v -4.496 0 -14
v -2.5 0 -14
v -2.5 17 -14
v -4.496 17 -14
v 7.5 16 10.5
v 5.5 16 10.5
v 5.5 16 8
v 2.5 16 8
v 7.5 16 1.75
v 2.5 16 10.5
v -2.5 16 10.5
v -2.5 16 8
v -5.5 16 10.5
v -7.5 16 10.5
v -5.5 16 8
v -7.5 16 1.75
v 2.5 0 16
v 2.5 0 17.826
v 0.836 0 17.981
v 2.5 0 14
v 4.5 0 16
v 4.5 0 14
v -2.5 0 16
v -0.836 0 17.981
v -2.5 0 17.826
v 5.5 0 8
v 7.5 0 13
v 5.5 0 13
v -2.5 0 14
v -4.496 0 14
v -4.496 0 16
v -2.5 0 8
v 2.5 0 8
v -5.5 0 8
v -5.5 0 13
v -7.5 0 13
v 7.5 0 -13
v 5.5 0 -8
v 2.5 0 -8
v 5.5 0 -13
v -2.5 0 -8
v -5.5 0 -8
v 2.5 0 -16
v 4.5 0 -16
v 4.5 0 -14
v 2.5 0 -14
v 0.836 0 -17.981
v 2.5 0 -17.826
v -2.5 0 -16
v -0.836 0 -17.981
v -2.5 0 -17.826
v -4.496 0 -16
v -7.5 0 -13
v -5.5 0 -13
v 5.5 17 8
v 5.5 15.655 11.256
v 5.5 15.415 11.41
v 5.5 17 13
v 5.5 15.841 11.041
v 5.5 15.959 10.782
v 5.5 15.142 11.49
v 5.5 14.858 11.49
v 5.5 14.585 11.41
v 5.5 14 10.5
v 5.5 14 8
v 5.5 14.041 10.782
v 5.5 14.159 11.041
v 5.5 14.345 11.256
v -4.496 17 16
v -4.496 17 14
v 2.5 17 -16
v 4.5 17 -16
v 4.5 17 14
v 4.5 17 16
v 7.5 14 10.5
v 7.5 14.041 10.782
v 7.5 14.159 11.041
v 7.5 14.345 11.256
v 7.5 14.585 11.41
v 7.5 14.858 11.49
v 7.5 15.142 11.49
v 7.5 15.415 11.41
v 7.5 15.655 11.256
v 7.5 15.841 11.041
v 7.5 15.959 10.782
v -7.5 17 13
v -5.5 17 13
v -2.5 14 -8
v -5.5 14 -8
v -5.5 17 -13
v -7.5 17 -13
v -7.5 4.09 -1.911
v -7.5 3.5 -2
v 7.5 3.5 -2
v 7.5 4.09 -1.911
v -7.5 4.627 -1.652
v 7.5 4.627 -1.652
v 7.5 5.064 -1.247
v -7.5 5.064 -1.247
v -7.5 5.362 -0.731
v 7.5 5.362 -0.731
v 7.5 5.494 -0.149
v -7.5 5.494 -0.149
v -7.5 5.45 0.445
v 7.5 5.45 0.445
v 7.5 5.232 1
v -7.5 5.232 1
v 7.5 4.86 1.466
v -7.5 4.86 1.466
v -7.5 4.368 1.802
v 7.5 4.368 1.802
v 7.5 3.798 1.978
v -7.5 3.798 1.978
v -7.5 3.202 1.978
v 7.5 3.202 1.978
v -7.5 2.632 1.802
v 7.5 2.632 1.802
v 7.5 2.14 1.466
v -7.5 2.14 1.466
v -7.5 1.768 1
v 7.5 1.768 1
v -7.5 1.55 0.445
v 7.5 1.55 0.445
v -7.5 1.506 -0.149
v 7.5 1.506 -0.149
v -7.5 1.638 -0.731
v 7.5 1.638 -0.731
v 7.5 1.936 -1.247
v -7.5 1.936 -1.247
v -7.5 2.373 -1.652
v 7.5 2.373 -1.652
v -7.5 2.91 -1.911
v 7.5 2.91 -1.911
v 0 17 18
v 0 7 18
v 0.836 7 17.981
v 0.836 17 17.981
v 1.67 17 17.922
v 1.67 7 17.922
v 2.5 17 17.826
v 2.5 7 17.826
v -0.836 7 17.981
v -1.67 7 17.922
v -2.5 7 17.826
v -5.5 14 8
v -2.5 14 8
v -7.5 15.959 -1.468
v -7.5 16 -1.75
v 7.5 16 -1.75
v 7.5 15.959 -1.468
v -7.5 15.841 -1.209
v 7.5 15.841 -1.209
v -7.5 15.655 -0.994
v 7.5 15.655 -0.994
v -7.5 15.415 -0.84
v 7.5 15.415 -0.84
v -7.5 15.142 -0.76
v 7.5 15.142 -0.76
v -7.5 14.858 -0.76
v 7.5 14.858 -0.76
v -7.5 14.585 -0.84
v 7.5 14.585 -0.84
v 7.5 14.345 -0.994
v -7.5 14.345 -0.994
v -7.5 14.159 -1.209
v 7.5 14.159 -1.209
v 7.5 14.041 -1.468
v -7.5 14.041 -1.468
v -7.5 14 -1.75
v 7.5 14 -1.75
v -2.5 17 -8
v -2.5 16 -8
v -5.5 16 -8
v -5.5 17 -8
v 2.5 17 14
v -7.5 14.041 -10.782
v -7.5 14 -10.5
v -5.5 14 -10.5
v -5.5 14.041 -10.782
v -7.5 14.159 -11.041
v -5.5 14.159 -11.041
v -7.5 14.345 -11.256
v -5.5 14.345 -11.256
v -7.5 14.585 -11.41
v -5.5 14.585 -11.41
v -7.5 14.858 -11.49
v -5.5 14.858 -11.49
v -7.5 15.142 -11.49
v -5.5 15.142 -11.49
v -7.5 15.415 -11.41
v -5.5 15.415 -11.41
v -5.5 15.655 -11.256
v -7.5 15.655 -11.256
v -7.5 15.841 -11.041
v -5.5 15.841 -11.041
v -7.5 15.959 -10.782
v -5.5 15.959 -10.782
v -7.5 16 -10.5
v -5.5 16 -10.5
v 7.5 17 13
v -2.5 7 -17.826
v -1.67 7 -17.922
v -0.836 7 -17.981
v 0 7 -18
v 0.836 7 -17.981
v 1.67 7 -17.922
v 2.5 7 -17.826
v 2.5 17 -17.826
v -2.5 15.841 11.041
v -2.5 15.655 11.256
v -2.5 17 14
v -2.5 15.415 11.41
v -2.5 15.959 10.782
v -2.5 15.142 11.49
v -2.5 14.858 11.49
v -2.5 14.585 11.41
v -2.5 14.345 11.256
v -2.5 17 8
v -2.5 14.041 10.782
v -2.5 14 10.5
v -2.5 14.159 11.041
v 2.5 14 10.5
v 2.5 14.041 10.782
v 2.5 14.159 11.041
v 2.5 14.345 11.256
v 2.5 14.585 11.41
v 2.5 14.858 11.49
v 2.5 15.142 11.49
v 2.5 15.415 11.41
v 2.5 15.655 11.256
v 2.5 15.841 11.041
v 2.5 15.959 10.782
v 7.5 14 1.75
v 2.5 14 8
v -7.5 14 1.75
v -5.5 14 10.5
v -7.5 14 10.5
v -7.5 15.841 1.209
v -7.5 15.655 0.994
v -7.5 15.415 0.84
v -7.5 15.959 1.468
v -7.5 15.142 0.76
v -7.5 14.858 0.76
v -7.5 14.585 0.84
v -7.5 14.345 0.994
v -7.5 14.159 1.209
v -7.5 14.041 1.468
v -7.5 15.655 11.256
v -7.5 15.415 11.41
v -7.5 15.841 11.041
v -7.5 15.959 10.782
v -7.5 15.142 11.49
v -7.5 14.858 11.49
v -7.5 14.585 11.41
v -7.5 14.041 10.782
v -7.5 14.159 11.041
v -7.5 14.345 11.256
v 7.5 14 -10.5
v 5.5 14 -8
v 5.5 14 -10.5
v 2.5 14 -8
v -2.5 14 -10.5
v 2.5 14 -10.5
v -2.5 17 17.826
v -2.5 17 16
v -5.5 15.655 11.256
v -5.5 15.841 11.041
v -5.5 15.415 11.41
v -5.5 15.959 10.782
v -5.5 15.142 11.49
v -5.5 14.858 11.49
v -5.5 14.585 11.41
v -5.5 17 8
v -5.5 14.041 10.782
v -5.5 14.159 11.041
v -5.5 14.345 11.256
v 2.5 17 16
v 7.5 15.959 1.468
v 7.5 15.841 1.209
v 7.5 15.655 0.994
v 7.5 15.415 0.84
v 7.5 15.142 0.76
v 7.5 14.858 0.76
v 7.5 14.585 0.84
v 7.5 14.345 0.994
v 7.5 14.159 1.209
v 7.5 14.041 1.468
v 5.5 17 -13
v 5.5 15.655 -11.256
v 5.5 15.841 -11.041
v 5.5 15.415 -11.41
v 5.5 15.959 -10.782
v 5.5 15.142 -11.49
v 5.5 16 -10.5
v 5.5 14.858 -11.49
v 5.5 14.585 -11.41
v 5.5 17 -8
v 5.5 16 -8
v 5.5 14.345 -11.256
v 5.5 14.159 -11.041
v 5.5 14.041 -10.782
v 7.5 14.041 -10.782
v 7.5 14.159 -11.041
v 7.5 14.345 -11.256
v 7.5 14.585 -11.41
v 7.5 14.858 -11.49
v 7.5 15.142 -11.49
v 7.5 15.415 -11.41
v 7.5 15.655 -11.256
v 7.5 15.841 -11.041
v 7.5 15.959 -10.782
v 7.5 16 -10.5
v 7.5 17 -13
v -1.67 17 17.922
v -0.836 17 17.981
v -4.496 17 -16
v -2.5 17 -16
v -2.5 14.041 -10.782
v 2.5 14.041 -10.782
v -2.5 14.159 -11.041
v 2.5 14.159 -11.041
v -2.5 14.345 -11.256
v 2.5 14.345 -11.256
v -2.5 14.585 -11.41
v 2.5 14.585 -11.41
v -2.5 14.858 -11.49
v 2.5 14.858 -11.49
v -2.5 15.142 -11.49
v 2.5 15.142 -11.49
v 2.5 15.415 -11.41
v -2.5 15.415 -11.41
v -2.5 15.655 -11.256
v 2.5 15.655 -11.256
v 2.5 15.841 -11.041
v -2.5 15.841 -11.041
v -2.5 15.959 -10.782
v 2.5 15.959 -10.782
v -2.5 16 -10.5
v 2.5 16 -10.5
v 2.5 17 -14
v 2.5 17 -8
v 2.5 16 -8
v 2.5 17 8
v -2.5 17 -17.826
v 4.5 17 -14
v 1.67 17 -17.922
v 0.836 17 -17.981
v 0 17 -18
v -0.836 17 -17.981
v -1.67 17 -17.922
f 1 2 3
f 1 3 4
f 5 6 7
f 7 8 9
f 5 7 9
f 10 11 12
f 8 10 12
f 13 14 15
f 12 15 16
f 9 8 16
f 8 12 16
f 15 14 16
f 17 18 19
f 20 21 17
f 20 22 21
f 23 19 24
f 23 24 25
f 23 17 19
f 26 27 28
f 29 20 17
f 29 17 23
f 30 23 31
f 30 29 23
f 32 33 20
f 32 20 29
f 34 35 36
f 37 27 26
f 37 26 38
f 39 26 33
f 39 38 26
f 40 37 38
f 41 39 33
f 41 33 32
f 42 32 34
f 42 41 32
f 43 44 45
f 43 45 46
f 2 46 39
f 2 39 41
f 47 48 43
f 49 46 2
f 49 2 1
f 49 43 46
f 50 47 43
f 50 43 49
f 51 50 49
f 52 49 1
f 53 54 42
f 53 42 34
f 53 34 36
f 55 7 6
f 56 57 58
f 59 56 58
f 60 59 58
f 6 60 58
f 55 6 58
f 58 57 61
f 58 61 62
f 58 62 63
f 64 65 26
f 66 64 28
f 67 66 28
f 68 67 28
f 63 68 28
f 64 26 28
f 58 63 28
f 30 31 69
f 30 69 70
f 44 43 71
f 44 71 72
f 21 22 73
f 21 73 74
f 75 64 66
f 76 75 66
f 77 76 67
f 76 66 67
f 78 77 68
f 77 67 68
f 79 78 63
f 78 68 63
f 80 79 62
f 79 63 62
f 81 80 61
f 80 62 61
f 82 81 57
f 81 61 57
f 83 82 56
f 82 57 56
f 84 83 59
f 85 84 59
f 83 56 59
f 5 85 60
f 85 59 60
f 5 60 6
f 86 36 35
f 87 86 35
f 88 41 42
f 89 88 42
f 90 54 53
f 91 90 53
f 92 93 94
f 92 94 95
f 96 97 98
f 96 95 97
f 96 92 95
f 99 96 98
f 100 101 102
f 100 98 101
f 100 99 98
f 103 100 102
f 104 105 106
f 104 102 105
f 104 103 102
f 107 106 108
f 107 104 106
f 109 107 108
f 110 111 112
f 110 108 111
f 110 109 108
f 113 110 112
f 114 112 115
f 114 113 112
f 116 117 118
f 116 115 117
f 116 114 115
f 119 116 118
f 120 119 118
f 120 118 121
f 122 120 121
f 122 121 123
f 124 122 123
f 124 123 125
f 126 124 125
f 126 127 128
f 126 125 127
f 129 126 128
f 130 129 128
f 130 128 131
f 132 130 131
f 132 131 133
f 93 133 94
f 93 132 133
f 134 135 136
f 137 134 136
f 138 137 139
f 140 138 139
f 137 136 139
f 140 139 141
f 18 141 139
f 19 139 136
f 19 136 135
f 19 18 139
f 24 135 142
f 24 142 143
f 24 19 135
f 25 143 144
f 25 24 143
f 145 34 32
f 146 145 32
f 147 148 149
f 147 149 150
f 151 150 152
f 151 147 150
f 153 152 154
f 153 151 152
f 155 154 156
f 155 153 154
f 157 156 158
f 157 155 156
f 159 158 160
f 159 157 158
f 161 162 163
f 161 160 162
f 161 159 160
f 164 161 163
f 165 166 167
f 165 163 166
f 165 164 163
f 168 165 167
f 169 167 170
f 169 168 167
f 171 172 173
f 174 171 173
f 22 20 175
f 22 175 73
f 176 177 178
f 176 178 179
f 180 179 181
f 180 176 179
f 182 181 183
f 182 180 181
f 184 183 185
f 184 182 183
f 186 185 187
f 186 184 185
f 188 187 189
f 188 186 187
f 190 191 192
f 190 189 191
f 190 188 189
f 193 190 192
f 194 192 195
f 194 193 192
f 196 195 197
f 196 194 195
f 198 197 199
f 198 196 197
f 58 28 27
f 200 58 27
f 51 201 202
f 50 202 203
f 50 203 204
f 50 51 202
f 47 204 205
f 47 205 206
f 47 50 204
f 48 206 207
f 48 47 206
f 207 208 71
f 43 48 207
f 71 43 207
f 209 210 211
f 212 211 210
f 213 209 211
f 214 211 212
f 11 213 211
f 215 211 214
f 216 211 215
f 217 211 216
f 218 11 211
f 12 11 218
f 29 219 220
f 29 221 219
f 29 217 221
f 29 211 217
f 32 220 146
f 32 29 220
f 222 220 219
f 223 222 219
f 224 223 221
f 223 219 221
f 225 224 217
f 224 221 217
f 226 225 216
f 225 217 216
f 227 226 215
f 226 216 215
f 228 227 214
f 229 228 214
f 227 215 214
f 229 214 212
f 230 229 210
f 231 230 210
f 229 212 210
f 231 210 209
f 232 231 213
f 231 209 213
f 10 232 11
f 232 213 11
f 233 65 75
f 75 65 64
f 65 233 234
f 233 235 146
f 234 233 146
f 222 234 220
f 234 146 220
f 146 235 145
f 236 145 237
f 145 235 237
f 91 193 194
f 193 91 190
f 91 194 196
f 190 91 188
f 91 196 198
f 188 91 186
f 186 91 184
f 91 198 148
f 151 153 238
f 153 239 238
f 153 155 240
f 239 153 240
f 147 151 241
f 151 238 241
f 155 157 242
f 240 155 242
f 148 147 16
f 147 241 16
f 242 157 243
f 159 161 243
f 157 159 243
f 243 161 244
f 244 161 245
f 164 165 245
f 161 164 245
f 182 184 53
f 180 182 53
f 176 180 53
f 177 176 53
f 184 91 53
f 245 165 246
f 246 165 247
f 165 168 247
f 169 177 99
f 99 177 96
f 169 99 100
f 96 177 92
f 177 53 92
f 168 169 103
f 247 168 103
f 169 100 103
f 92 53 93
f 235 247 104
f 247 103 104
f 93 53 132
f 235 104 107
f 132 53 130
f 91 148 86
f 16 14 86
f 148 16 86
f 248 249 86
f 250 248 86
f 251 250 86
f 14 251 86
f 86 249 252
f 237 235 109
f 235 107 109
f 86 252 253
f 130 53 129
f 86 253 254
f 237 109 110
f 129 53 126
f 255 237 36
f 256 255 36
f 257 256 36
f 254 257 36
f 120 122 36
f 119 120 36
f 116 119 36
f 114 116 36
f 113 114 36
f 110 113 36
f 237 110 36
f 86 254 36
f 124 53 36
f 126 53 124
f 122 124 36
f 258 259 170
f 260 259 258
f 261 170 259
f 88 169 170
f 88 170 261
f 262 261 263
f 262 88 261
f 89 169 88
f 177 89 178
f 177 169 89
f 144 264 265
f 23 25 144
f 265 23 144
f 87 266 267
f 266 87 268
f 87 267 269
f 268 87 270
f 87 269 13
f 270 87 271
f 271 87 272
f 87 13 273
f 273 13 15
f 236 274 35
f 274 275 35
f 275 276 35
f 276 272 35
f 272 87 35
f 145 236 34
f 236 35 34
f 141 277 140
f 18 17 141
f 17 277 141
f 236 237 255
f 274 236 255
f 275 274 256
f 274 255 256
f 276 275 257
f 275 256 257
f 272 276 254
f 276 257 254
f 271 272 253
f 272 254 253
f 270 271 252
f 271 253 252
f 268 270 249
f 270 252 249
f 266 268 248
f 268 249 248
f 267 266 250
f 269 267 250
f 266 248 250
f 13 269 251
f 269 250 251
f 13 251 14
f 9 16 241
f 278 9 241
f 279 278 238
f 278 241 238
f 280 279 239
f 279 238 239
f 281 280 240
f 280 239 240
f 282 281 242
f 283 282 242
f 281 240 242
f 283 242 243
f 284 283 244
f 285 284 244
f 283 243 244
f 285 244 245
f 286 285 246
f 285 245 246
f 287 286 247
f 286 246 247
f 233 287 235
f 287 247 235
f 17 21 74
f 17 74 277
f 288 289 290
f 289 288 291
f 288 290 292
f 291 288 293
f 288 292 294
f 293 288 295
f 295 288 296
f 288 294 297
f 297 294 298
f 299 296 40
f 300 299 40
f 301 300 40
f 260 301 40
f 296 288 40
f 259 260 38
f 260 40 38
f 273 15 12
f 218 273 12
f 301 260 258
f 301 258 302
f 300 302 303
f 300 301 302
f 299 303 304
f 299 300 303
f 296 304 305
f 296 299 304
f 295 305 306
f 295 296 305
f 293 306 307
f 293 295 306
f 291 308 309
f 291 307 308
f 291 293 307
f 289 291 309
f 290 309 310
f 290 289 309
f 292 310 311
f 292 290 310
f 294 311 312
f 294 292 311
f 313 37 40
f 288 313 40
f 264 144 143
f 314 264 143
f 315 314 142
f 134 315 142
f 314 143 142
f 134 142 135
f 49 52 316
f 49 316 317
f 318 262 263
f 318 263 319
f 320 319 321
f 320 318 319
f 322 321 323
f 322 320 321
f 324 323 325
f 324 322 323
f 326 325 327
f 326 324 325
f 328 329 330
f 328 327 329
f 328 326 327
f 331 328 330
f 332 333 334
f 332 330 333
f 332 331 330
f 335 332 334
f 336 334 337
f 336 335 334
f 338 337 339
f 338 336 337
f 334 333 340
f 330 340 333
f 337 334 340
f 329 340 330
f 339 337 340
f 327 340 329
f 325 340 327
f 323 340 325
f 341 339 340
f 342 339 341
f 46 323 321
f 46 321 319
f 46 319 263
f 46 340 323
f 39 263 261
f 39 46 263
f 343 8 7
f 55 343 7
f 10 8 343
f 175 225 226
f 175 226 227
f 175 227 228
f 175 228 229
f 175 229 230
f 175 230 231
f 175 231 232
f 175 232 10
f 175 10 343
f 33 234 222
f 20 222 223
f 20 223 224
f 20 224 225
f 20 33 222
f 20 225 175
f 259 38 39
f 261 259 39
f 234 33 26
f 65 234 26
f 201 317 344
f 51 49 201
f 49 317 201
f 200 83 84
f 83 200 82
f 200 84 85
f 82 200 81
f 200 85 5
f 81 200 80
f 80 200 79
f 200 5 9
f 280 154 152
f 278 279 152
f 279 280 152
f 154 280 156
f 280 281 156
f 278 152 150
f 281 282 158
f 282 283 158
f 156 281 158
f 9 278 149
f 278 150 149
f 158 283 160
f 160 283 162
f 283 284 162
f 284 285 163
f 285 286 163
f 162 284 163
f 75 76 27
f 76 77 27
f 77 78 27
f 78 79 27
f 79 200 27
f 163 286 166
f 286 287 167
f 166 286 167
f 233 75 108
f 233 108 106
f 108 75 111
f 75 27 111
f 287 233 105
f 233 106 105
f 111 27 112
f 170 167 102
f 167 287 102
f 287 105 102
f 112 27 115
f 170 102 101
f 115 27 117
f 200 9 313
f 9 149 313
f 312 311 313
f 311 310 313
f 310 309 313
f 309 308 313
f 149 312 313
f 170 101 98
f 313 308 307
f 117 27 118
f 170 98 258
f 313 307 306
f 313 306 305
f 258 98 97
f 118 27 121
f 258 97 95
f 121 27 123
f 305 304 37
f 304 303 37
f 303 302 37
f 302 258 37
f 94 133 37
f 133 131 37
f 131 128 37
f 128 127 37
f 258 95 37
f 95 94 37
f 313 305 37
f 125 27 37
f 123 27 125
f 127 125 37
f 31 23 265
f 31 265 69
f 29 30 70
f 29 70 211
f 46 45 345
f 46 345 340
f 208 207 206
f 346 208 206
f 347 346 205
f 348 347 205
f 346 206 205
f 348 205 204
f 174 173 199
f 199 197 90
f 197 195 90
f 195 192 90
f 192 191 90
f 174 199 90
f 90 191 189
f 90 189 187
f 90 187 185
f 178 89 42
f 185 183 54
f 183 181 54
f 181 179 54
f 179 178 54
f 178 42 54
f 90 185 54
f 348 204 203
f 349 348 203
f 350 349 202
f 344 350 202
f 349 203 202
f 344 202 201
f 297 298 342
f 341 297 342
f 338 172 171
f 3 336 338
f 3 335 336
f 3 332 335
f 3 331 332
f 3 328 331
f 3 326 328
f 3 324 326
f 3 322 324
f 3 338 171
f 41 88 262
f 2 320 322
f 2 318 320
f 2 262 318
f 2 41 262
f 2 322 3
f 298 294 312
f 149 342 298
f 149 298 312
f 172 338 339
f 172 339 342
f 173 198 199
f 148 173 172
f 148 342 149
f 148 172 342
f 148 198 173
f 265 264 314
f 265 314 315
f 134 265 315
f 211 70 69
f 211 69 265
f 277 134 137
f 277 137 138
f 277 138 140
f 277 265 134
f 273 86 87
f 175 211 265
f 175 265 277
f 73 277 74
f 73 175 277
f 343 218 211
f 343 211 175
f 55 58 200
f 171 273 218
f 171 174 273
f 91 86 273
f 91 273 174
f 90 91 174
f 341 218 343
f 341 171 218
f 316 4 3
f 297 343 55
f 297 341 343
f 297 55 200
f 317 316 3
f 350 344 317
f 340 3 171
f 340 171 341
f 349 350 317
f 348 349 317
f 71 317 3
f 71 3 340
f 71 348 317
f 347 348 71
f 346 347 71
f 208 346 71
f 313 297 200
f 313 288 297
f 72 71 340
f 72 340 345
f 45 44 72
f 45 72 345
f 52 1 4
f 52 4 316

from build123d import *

# Parameters (mm, degrees)
EXTRUDE_7_DEPTH          = 7
EXTRUDE_START            = 7
SKETCH_11_W              = 5
SKETCH_11_H              = 16
EXTRUDE_8_DEPTH          = 10
EXTRUDE_10_DEPTH         = 17
CUT_EXTRUDE_1_DEPTH      = 26.869866641
CUT_EXTRUDE_1_DEPTH_BACK = 26.869866641
SKETCH_15_R              = 2
CUT_EXTRUDE_2_DEPTH      = 26.869866641
CUT_EXTRUDE_2_DEPTH_BACK = 26.869866641


with BuildPart() as part:
    # 草图8 → 凸台-拉伸7 (new body)
    with BuildSketch(Plane(origin=(0, 0, 0), x_dir=(1, 0, 0), z_dir=(0, 1, 0))):
        with BuildLine():
            Line((4.5, -16), (2.5, -16))
            Line((2.5, -16), (2.5, -17.82554347))
            ThreePointArc((2.5, -17.82554347), (0, -18), (-2.5, -17.82554347))
            Line((-2.5, -17.82554347), (-2.5, -16))
            Line((-2.5, -16), (-4.49639369, -16))
            Line((-4.49639369, -16), (-4.49639369, -14))
            Line((-4.49639369, -14), (-2.5, -14))
            Line((-2.5, -14), (-2.5, -13))
            Line((-2.5, -13), (-2.5, 13))
            Line((-2.5, 13), (-2.5, 14))
            Line((-2.5, 14), (-4.49639369, 14))
            Line((-4.49639369, 14), (-4.49639369, 16))
            Line((-4.49639369, 16), (-2.5, 16))
            Line((-2.5, 16), (-2.5, 17.82554347))
            ThreePointArc((-2.5, 17.82554347), (0, 18), (2.5, 17.82554347))
            Line((2.5, 17.82554347), (2.5, 16))
            Line((2.5, 16), (4.5, 16))
            Line((4.5, 16), (4.5, 14))
            Line((4.5, 14), (2.5, 14))
            Line((2.5, 14), (2.5, 13))
            Line((2.5, 13), (2.5, -13))
            Line((2.5, -13), (2.5, -14))
            Line((2.5, -14), (4.5, -14))
            Line((4.5, -14), (4.5, -16))
        make_face()
    extrude(amount=EXTRUDE_7_DEPTH)

    # 草图11 → 凸台-拉伸8 (add)
    with BuildSketch(Plane(origin=(0, 0, 0), x_dir=(1, 0, 0), z_dir=(0, 1, 0)).offset(EXTRUDE_START)):
        Rectangle(SKETCH_11_W, SKETCH_11_H)
    extrude(amount=EXTRUDE_8_DEPTH)

    # 草图14 → 凸台-拉伸10 (add)
    with BuildSketch(Plane(origin=(0, 0, 0), x_dir=(1, 0, 0), z_dir=(0, 1, 0))):
        with BuildLine():
            ThreePointArc((-2.5, -17.82554347), (-1.253039812, -17.9563329), (0, -18))
            Line((0, -18), (0, 18))
            ThreePointArc((0, 18), (-1.253039812, 17.9563329), (-2.5, 17.82554347))
            Line((-2.5, 17.82554347), (-2.5, 16))
            Line((-2.5, 16), (-4.49639369, 16))
            Line((-4.49639369, 16), (-4.49639369, 14))
            Line((-4.49639369, 14), (-2.5, 14))
            Line((-2.5, 14), (-2.5, 8))
            Line((-2.5, 8), (-5.5, 8))
            Line((-5.5, 8), (-5.5, 13))
            Line((-5.5, 13), (-7.5, 13))
            Line((-7.5, 13), (-7.5, -13))
            Line((-7.5, -13), (-5.5, -13))
            Line((-5.5, -13), (-5.5, -8))
            Line((-5.5, -8), (-2.5, -8))
            Line((-2.5, -8), (-2.5, -14))
            Line((-2.5, -14), (-4.49639369, -14))
            Line((-4.49639369, -14), (-4.49639369, -16))
            Line((-4.49639369, -16), (-2.5, -16))
            Line((-2.5, -16), (-2.5, -17.82554347))
        make_face()
        with BuildLine():
            Line((4.5, -14), (2.5, -14))
            Line((2.5, -14), (2.5, -8))
            Line((2.5, -8), (5.5, -8))
            Line((5.5, -8), (5.5, -13))
            Line((5.5, -13), (7.5, -13))
            Line((7.5, -13), (7.5, 13))
            Line((7.5, 13), (5.5, 13))
            Line((5.5, 13), (5.5, 8))
            Line((5.5, 8), (2.5, 8))
            Line((2.5, 8), (2.5, 14))
            Line((2.5, 14), (4.5, 14))
            Line((4.5, 14), (4.5, 16))
            Line((4.5, 16), (2.5, 16))
            Line((2.5, 16), (2.5, 17.82554347))
            ThreePointArc((2.5, 17.82554347), (1.253039812, 17.9563329), (0, 18))
            Line((0, 18), (0, -18))
            ThreePointArc((0, -18), (1.253039812, -17.9563329), (2.5, -17.82554347))
            Line((2.5, -17.82554347), (2.5, -16))
            Line((2.5, -16), (4.5, -16))
            Line((4.5, -16), (4.5, -14))
        make_face()
    extrude(amount=EXTRUDE_10_DEPTH)

    # 草图15 → 切除-拉伸1 (cut, two sides: drawn at the far end of the back side and taken through both)
    with BuildSketch(Plane(origin=(0, 0, 0), x_dir=(0, 0, -1), z_dir=(1, 0, 0)).offset(-CUT_EXTRUDE_1_DEPTH_BACK)):
        with Locations((0, 3.5)):
            Circle(SKETCH_15_R)
    extrude(amount=CUT_EXTRUDE_1_DEPTH + CUT_EXTRUDE_1_DEPTH_BACK, mode=Mode.SUBTRACT)

    # 草图17 → 切除-拉伸2 (cut, two sides: drawn at the far end of the back side and taken through both)
    with BuildSketch(Plane(origin=(0, 0, 0), x_dir=(0, 0, -1), z_dir=(1, 0, 0)).offset(-CUT_EXTRUDE_2_DEPTH_BACK)):
        with BuildLine():
            Line((-10.5, 16), (-1.75, 16))
            ThreePointArc((-1.75, 16), (-0.75, 15), (-1.75, 14))
            Line((-1.75, 14), (-10.5, 14))
            ThreePointArc((-10.5, 14), (-11.5, 15), (-10.5, 16))
        make_face()
        with BuildLine():
            Line((1.75, 14), (10.5, 14))
            ThreePointArc((10.5, 14), (11.5, 15), (10.5, 16))
            Line((10.5, 16), (1.75, 16))
            ThreePointArc((1.75, 16), (0.75, 15), (1.75, 14))
        make_face()
    extrude(amount=CUT_EXTRUDE_2_DEPTH + CUT_EXTRUDE_2_DEPTH_BACK, mode=Mode.SUBTRACT)


solid = part.part
